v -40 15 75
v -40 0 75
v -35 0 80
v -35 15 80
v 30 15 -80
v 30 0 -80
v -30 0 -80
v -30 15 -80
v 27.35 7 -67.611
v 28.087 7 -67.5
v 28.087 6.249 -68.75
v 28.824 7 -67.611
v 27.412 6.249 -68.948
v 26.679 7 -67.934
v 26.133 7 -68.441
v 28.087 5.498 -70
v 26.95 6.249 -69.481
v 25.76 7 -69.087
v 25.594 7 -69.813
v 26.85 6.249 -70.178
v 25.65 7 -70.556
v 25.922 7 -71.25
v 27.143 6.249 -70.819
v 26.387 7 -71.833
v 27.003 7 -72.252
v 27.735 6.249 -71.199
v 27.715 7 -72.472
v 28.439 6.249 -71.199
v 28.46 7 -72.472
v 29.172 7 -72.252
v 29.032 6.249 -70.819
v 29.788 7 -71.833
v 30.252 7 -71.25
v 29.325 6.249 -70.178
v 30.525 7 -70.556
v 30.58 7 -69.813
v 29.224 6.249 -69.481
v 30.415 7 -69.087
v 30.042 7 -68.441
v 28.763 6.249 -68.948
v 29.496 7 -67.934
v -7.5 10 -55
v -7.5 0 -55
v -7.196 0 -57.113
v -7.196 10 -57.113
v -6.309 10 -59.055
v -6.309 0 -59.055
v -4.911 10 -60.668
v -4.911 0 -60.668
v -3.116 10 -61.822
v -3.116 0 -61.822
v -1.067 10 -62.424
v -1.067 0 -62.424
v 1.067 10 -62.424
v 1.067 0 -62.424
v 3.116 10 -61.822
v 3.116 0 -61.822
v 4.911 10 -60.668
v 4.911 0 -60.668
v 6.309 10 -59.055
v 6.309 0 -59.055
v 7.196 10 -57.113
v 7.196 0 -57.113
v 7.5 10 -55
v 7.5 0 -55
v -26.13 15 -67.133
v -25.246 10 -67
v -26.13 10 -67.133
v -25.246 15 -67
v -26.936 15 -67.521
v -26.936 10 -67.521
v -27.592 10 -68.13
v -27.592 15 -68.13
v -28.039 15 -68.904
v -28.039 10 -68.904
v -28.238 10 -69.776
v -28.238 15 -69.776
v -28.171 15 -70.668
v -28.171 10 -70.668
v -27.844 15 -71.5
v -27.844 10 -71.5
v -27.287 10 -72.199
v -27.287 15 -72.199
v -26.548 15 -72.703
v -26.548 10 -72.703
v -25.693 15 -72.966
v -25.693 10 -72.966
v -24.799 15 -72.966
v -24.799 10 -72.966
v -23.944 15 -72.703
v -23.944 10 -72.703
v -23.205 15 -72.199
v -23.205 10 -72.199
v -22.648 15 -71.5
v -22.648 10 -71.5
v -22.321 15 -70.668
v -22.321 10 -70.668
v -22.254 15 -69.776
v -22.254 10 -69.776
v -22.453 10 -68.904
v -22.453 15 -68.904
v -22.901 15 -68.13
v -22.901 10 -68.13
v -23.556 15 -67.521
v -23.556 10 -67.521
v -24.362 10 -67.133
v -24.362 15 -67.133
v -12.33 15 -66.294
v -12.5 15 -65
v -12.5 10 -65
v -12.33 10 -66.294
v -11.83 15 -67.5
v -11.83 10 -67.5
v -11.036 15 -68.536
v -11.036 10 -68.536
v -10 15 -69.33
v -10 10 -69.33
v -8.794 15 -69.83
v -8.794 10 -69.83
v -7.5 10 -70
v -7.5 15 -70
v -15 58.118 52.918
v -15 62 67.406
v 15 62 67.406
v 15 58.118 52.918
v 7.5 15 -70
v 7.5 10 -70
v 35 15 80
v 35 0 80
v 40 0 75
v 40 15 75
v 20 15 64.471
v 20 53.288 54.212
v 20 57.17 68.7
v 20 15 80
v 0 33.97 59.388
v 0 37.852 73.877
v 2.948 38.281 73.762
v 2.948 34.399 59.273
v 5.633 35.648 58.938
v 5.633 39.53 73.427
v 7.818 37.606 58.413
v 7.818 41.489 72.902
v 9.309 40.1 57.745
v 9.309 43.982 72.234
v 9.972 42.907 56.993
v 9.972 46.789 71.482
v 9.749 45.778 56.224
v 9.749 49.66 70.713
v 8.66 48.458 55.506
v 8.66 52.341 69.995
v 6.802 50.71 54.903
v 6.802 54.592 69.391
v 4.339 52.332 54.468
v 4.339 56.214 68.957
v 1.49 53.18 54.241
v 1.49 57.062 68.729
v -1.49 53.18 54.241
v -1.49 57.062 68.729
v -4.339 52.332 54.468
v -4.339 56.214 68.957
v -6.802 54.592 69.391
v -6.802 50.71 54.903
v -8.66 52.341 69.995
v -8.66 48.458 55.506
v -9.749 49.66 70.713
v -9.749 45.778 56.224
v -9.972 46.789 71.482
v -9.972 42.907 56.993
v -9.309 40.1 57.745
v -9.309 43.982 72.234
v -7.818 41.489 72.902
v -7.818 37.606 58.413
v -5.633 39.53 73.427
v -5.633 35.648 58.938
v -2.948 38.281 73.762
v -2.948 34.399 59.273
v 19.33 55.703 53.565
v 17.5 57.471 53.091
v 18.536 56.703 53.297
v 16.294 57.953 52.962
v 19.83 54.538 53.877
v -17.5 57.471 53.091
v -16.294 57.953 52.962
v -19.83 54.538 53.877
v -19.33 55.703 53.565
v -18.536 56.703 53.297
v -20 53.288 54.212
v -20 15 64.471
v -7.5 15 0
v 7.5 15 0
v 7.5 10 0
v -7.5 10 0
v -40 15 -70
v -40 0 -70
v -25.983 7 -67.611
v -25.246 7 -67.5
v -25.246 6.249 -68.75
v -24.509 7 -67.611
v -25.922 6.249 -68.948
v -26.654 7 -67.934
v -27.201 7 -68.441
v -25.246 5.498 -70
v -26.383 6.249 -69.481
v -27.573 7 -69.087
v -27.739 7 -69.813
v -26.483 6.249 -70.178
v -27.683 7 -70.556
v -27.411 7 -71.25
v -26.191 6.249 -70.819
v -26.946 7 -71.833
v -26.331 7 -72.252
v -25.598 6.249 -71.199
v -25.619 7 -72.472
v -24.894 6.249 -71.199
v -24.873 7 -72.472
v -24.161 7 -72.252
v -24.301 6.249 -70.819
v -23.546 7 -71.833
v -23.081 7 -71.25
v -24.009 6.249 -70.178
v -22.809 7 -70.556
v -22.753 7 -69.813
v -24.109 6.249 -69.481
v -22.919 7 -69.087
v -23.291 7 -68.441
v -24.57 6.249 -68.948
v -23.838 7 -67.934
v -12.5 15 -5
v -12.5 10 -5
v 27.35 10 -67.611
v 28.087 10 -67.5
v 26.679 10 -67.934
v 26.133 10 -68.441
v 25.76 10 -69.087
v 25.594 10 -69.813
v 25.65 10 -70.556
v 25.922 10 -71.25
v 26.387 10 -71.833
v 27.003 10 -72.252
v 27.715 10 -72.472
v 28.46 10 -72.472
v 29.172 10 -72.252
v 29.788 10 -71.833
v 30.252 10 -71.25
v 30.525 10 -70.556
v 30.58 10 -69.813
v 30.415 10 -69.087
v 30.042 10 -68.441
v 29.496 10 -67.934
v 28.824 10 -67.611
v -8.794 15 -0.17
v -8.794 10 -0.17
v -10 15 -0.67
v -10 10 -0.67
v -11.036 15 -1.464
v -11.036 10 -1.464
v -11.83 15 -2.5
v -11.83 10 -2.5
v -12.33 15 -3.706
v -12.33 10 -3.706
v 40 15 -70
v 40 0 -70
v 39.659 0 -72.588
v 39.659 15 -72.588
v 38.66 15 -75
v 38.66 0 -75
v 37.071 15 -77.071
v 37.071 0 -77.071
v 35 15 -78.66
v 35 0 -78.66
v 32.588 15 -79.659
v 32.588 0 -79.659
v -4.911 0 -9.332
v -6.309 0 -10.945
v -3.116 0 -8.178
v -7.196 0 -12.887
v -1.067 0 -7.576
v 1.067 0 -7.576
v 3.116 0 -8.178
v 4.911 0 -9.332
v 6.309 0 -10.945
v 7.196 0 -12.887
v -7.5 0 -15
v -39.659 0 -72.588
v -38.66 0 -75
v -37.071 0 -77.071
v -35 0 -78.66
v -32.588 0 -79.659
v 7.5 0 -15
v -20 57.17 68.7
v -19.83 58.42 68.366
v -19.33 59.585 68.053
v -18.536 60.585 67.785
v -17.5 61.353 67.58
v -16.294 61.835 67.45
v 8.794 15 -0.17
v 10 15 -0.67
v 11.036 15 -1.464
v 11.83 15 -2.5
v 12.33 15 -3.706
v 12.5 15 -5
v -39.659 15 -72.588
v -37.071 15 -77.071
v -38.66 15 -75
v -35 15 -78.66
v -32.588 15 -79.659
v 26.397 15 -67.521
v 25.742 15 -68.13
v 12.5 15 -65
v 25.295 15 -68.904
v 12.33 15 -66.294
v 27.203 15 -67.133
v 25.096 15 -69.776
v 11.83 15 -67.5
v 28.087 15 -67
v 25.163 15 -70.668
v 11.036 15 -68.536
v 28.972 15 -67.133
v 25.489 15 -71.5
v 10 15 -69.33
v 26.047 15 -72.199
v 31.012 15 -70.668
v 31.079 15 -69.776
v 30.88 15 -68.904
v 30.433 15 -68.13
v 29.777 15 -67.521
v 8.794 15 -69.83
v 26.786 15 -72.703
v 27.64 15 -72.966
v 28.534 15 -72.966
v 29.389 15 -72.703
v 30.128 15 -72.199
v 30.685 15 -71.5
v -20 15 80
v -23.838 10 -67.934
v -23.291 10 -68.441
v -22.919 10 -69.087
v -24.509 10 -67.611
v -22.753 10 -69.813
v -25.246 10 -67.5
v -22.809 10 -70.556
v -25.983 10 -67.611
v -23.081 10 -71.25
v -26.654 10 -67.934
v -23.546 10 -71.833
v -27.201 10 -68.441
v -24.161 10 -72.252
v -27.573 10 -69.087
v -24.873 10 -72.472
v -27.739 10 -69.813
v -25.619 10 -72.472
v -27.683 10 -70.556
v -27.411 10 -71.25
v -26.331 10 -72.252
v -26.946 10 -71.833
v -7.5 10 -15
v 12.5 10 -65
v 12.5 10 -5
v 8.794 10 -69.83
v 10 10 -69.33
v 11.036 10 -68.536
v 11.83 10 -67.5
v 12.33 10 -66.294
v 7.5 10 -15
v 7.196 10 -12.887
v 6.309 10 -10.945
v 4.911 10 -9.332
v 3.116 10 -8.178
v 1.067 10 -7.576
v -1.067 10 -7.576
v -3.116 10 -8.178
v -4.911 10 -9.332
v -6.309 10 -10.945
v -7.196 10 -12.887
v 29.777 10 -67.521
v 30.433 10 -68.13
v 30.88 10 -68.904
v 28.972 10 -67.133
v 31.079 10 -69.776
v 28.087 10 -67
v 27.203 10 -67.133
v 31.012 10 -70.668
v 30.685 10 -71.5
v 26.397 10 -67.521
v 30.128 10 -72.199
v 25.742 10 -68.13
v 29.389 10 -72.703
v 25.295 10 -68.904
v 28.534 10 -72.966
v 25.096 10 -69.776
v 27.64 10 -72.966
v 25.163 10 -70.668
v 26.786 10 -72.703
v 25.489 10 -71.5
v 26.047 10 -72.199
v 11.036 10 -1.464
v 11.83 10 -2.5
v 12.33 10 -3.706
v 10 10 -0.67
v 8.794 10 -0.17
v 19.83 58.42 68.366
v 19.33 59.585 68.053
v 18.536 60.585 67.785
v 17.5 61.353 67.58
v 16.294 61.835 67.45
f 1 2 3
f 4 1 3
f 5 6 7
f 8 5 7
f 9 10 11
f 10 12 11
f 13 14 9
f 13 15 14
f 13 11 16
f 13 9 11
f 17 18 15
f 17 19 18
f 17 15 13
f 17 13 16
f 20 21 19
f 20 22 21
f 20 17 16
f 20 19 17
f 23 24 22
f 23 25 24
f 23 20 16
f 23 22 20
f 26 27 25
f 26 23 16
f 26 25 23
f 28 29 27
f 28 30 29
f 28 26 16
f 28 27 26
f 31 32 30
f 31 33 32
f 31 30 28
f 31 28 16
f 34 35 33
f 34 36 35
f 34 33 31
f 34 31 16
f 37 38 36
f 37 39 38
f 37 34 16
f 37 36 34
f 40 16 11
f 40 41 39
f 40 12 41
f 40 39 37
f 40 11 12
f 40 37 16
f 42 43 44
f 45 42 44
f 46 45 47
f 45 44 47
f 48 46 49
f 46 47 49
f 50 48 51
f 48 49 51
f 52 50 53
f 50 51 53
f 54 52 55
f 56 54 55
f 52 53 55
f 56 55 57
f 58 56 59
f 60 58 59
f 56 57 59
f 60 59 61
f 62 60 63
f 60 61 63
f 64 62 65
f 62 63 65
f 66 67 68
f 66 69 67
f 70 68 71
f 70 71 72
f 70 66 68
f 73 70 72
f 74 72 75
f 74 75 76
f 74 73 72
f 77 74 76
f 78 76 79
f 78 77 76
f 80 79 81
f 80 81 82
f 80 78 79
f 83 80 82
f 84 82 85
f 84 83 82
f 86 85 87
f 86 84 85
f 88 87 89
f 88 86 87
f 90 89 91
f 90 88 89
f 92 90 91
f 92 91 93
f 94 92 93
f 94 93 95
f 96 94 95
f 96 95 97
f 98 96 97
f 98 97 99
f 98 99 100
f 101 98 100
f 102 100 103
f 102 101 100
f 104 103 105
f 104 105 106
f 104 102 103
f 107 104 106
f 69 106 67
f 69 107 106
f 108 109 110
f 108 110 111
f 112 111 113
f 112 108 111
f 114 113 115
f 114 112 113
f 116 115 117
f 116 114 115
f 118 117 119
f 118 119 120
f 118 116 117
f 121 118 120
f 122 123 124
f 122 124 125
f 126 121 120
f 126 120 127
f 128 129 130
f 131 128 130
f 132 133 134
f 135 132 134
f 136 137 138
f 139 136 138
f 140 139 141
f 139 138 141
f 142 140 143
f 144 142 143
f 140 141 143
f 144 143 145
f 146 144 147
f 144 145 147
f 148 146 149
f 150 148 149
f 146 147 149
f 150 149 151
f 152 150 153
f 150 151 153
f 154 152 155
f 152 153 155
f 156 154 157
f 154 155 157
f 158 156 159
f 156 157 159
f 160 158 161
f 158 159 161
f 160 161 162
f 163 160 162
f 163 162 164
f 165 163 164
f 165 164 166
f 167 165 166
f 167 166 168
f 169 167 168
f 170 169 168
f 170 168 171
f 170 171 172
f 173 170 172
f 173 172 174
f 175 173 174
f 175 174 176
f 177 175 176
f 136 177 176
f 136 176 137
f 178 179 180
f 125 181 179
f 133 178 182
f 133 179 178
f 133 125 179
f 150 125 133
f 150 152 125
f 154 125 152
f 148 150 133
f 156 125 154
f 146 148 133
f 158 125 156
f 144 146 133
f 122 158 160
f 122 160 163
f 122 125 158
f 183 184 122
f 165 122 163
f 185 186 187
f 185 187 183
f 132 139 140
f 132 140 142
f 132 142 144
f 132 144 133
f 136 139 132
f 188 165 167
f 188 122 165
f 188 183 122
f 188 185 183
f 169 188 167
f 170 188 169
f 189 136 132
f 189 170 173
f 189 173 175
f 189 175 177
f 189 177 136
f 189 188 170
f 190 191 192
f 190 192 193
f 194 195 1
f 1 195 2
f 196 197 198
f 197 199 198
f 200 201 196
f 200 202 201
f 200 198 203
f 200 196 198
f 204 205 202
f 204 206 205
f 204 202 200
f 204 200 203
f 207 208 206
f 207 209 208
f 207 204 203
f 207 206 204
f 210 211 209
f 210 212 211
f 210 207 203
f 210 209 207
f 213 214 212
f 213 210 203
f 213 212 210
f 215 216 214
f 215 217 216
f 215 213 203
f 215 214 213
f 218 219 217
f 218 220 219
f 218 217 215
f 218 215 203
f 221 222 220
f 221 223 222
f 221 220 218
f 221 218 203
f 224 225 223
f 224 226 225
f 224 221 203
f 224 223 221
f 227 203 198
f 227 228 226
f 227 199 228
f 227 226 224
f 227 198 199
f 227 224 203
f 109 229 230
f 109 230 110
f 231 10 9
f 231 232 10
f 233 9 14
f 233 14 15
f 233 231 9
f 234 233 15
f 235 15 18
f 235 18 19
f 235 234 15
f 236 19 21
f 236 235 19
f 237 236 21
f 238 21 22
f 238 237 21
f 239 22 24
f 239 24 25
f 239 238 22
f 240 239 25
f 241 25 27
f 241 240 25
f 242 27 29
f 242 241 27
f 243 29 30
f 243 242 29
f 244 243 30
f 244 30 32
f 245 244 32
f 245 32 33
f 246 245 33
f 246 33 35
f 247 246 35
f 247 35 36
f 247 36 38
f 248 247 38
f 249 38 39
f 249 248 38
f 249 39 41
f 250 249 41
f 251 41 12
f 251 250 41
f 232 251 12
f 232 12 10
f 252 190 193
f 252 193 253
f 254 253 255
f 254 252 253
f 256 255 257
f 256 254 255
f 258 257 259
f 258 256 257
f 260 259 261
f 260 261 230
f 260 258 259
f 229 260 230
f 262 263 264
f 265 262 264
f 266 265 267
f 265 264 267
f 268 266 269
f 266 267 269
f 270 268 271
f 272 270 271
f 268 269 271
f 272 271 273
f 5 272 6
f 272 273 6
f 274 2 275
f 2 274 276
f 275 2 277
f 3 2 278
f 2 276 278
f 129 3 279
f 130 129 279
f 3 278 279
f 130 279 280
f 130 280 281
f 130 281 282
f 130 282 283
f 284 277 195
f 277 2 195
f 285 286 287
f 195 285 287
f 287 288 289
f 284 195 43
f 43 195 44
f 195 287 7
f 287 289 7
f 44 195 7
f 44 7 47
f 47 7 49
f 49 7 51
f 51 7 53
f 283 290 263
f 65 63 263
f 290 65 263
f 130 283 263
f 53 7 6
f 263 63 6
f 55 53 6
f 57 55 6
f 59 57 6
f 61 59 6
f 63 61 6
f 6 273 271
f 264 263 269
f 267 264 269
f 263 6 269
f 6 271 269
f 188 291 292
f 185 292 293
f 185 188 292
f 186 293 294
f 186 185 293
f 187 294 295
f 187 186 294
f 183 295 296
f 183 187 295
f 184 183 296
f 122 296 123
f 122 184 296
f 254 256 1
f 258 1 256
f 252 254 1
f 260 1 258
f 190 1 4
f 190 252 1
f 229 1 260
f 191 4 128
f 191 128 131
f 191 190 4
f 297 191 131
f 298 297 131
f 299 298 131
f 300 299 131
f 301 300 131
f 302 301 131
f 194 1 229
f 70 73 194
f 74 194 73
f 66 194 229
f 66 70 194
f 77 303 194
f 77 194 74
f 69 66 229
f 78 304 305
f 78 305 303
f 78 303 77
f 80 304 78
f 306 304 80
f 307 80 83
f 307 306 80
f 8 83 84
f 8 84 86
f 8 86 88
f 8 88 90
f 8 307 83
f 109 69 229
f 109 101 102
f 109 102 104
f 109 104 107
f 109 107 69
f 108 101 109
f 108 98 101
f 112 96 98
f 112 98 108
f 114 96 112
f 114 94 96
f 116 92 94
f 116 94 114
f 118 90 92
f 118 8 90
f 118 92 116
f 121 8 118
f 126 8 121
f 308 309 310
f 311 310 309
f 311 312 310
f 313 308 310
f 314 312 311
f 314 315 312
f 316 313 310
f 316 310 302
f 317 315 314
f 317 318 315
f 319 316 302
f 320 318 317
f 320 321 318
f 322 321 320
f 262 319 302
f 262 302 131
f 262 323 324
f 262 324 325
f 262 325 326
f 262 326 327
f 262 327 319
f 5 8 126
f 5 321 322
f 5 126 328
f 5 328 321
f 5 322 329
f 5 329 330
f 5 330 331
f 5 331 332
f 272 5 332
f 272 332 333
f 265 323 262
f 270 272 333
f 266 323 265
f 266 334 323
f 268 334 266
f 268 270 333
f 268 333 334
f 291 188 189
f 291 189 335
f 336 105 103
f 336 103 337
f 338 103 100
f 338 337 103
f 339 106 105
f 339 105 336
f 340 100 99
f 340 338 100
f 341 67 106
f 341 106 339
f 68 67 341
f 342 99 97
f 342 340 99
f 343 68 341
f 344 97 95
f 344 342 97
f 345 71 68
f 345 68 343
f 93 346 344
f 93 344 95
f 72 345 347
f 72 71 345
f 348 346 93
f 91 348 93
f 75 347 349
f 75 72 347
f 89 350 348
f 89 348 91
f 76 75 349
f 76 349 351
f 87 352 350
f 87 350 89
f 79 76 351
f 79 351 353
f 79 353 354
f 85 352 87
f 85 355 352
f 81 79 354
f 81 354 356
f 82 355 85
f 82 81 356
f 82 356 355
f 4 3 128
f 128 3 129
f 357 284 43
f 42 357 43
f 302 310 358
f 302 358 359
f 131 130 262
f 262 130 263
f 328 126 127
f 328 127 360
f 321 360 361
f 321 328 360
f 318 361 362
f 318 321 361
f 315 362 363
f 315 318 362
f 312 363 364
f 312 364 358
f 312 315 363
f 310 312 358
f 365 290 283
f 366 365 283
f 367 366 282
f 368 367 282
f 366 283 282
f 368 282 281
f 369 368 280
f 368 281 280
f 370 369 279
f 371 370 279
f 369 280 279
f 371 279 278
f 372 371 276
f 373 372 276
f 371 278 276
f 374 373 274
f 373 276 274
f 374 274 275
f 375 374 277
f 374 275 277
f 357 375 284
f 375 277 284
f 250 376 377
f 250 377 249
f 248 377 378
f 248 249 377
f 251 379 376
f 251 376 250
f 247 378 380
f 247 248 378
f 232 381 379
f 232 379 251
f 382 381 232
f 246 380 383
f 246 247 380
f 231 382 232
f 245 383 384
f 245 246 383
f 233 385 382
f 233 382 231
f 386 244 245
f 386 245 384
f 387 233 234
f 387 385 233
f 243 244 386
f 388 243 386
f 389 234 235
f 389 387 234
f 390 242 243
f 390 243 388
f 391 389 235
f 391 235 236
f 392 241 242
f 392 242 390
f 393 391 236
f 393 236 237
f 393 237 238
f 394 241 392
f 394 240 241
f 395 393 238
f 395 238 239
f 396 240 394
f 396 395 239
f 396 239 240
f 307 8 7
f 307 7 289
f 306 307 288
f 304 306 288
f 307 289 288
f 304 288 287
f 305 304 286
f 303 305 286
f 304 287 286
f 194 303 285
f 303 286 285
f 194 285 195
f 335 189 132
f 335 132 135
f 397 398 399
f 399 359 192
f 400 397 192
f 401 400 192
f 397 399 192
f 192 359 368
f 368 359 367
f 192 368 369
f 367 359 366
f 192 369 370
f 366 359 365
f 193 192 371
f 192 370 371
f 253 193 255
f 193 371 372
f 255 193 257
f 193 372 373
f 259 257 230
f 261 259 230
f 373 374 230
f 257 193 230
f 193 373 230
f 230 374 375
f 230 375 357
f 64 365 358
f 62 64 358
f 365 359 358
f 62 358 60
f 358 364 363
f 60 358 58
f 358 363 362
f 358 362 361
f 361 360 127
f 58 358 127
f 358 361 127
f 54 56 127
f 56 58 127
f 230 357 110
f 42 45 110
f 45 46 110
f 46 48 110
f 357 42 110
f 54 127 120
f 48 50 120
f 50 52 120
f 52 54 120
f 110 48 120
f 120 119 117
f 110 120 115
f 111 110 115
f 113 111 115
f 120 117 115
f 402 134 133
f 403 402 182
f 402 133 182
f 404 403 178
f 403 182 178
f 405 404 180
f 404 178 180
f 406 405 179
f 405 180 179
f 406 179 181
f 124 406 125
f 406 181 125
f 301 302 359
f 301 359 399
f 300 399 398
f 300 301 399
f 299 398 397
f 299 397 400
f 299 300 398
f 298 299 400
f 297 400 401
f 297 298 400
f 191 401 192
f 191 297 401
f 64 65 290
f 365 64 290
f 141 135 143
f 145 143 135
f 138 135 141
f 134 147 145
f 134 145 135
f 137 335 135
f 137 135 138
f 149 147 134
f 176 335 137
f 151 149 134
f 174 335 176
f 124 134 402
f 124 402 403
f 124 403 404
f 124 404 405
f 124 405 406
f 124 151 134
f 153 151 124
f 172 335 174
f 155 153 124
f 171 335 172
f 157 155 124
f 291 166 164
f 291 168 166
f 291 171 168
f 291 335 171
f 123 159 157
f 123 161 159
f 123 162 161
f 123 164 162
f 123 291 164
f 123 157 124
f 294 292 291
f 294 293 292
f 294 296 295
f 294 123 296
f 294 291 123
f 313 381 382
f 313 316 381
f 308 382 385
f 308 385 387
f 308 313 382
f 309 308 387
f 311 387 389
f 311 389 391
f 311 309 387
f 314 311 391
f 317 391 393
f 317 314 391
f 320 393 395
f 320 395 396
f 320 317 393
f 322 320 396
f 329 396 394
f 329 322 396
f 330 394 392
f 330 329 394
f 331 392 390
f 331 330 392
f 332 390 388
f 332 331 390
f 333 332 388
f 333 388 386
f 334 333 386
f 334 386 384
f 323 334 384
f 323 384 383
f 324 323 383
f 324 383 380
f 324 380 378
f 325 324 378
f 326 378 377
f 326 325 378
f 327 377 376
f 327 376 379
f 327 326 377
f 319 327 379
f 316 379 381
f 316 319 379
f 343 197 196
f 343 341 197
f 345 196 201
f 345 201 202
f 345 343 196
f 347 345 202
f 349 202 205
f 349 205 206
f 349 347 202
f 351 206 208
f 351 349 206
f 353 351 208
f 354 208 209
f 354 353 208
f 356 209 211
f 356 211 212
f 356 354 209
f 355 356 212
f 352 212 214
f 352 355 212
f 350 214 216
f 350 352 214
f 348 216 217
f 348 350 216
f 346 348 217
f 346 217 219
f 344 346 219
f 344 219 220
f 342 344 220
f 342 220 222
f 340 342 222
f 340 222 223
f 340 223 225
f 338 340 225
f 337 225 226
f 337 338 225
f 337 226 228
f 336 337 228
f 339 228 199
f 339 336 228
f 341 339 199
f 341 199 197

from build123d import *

# Parameters (mm, degrees)
BOSS_EXTRUDE1_DEPTH            = 15
CUT_EXTRUDE1_DEPTH             = 5
BOSS_EXTRUDE2_DEPTH            = 20
BOSS_EXTRUDE2_DEPTH_BACK       = 20
SKETCH4_R                      = 10
CUT_EXTRUDE2_DEPTH             = 20
FILLET1_R                      = 5
M6X1_0_TAPPED_HOLE1_AT_2_COUNT = 2
M6X1_0_TAPPED_HOLE1_AT_2_PITCH = 53.333333333


with BuildPart() as part:
    # Sketch1 → Boss-Extrude1 (new body)
    with BuildSketch(Plane(origin=(0, 0, 0), x_dir=(1, 0, 0), z_dir=(0, 1, 0))):
        with BuildLine():
            Line((-40, -75), (-35, -80))
            Line((-35, -80), (35, -80))
            Line((35, -80), (40, -75))
            Line((40, -75), (40, 70))
            ThreePointArc((40, 70), (37.071067812, 77.071067812), (30, 80))
            Line((30, 80), (-30, 80))
            ThreePointArc((-30, 80), (-37.071067812, 77.071067812), (-40, 70))
            Line((-40, 70), (-40, -75))
        make_face()
        with BuildLine():
            Line((-7.5, 15), (-7.5, 55))
            ThreePointArc((-7.5, 55), (0, 62.5), (7.5, 55))
            Line((7.5, 55), (7.5, 15))
            ThreePointArc((7.5, 15), (0, 7.5), (-7.5, 15))
        make_face(mode=Mode.SUBTRACT)
    extrude(amount=BOSS_EXTRUDE1_DEPTH)

    # Sketch2 → Cut-Extrude1 (cut)
    with BuildSketch(Plane(origin=(0, 15, 0), x_dir=(1, 0, 0), z_dir=(0, 1, 0))):
        with BuildLine():
            Line((-7.5, 70), (7.5, 70))
            ThreePointArc((7.5, 70), (11.035533906, 68.535533906), (12.5, 65))
            Line((12.5, 65), (12.5, 5))
            ThreePointArc((12.5, 5), (11.035533906, 1.464466094), (7.5, 0))
            Line((7.5, 0), (-7.5, 0))
            ThreePointArc((-7.5, 0), (-11.035533906, 1.464466094), (-12.5, 5))
            Line((-12.5, 5), (-12.5, 65))
            ThreePointArc((-12.5, 65), (-11.035533906, 68.535533906), (-7.5, 70))
        make_face()
    extrude(amount=-CUT_EXTRUDE1_DEPTH, mode=Mode.SUBTRACT)

    # Sketch7 → M6x1.0 Tapped Hole1 (revolve, cut)
    with BuildSketch(Plane(origin=(-25.246007907, 15, -70), x_dir=(0, 0, 1), z_dir=(1, 0, 0))):
        Polygon((0, 0), (0, 9.502151548), (2.5, 8), (2.5, 5), (3, 5), (3, 0), align=None)
    m6x1_0_tapped_hole1 = revolve(axis=Axis((-25.246007907, 21.35, -70), (0, -1, 0)), mode=Mode.SUBTRACT)

    # M6x1.0 Tapped Hole1 at 2: M6x1.0 Tapped Hole1 ×2
    with Locations(*[(i * M6X1_0_TAPPED_HOLE1_AT_2_PITCH, 0, 0) for i in range(1, M6X1_0_TAPPED_HOLE1_AT_2_COUNT)]):
        add(m6x1_0_tapped_hole1, mode=Mode.SUBTRACT)


with BuildPart() as body_2:
    # Sketch3 → Boss-Extrude2 (new, two sides: drawn at the far end of the back side and taken through both)
    with BuildSketch(Plane(origin=(0, 0, 0), x_dir=(0, 0, -1), z_dir=(1, 0, 0)).offset(-BOSS_EXTRUDE2_DEPTH_BACK)):
        Polygon((-64.470857294, 15), (-80, 15), (-67.406387956, 62), (-52.917500561, 58.117714323), align=None)
    extrude(amount=BOSS_EXTRUDE2_DEPTH + BOSS_EXTRUDE2_DEPTH_BACK)

    # Sketch4 → Cut-Extrude2 (cut)
    with BuildSketch(Plane(origin=(0, 21.004809472, 78.391016151), x_dir=(1, 0, 0), z_dir=(0, 0.25881904510251763, 0.9659258262890692))):
        with Locations(Location((0, 27.441344265, 0), (0, 0, 270))):
            Circle(SKETCH4_R)
    extrude(amount=-CUT_EXTRUDE2_DEPTH, mode=Mode.SUBTRACT)

    # Fillet1
    fillet1_edges = [body_2.edges().sort_by_distance(p)[0] for p in [
        (20, 60.058857162, 60.161944259),
        (-20, 60.058857162, 60.161944259),
    ]]
    fillet(fillet1_edges, radius=FILLET1_R)


solid = Compound([part.part, body_2.part])
